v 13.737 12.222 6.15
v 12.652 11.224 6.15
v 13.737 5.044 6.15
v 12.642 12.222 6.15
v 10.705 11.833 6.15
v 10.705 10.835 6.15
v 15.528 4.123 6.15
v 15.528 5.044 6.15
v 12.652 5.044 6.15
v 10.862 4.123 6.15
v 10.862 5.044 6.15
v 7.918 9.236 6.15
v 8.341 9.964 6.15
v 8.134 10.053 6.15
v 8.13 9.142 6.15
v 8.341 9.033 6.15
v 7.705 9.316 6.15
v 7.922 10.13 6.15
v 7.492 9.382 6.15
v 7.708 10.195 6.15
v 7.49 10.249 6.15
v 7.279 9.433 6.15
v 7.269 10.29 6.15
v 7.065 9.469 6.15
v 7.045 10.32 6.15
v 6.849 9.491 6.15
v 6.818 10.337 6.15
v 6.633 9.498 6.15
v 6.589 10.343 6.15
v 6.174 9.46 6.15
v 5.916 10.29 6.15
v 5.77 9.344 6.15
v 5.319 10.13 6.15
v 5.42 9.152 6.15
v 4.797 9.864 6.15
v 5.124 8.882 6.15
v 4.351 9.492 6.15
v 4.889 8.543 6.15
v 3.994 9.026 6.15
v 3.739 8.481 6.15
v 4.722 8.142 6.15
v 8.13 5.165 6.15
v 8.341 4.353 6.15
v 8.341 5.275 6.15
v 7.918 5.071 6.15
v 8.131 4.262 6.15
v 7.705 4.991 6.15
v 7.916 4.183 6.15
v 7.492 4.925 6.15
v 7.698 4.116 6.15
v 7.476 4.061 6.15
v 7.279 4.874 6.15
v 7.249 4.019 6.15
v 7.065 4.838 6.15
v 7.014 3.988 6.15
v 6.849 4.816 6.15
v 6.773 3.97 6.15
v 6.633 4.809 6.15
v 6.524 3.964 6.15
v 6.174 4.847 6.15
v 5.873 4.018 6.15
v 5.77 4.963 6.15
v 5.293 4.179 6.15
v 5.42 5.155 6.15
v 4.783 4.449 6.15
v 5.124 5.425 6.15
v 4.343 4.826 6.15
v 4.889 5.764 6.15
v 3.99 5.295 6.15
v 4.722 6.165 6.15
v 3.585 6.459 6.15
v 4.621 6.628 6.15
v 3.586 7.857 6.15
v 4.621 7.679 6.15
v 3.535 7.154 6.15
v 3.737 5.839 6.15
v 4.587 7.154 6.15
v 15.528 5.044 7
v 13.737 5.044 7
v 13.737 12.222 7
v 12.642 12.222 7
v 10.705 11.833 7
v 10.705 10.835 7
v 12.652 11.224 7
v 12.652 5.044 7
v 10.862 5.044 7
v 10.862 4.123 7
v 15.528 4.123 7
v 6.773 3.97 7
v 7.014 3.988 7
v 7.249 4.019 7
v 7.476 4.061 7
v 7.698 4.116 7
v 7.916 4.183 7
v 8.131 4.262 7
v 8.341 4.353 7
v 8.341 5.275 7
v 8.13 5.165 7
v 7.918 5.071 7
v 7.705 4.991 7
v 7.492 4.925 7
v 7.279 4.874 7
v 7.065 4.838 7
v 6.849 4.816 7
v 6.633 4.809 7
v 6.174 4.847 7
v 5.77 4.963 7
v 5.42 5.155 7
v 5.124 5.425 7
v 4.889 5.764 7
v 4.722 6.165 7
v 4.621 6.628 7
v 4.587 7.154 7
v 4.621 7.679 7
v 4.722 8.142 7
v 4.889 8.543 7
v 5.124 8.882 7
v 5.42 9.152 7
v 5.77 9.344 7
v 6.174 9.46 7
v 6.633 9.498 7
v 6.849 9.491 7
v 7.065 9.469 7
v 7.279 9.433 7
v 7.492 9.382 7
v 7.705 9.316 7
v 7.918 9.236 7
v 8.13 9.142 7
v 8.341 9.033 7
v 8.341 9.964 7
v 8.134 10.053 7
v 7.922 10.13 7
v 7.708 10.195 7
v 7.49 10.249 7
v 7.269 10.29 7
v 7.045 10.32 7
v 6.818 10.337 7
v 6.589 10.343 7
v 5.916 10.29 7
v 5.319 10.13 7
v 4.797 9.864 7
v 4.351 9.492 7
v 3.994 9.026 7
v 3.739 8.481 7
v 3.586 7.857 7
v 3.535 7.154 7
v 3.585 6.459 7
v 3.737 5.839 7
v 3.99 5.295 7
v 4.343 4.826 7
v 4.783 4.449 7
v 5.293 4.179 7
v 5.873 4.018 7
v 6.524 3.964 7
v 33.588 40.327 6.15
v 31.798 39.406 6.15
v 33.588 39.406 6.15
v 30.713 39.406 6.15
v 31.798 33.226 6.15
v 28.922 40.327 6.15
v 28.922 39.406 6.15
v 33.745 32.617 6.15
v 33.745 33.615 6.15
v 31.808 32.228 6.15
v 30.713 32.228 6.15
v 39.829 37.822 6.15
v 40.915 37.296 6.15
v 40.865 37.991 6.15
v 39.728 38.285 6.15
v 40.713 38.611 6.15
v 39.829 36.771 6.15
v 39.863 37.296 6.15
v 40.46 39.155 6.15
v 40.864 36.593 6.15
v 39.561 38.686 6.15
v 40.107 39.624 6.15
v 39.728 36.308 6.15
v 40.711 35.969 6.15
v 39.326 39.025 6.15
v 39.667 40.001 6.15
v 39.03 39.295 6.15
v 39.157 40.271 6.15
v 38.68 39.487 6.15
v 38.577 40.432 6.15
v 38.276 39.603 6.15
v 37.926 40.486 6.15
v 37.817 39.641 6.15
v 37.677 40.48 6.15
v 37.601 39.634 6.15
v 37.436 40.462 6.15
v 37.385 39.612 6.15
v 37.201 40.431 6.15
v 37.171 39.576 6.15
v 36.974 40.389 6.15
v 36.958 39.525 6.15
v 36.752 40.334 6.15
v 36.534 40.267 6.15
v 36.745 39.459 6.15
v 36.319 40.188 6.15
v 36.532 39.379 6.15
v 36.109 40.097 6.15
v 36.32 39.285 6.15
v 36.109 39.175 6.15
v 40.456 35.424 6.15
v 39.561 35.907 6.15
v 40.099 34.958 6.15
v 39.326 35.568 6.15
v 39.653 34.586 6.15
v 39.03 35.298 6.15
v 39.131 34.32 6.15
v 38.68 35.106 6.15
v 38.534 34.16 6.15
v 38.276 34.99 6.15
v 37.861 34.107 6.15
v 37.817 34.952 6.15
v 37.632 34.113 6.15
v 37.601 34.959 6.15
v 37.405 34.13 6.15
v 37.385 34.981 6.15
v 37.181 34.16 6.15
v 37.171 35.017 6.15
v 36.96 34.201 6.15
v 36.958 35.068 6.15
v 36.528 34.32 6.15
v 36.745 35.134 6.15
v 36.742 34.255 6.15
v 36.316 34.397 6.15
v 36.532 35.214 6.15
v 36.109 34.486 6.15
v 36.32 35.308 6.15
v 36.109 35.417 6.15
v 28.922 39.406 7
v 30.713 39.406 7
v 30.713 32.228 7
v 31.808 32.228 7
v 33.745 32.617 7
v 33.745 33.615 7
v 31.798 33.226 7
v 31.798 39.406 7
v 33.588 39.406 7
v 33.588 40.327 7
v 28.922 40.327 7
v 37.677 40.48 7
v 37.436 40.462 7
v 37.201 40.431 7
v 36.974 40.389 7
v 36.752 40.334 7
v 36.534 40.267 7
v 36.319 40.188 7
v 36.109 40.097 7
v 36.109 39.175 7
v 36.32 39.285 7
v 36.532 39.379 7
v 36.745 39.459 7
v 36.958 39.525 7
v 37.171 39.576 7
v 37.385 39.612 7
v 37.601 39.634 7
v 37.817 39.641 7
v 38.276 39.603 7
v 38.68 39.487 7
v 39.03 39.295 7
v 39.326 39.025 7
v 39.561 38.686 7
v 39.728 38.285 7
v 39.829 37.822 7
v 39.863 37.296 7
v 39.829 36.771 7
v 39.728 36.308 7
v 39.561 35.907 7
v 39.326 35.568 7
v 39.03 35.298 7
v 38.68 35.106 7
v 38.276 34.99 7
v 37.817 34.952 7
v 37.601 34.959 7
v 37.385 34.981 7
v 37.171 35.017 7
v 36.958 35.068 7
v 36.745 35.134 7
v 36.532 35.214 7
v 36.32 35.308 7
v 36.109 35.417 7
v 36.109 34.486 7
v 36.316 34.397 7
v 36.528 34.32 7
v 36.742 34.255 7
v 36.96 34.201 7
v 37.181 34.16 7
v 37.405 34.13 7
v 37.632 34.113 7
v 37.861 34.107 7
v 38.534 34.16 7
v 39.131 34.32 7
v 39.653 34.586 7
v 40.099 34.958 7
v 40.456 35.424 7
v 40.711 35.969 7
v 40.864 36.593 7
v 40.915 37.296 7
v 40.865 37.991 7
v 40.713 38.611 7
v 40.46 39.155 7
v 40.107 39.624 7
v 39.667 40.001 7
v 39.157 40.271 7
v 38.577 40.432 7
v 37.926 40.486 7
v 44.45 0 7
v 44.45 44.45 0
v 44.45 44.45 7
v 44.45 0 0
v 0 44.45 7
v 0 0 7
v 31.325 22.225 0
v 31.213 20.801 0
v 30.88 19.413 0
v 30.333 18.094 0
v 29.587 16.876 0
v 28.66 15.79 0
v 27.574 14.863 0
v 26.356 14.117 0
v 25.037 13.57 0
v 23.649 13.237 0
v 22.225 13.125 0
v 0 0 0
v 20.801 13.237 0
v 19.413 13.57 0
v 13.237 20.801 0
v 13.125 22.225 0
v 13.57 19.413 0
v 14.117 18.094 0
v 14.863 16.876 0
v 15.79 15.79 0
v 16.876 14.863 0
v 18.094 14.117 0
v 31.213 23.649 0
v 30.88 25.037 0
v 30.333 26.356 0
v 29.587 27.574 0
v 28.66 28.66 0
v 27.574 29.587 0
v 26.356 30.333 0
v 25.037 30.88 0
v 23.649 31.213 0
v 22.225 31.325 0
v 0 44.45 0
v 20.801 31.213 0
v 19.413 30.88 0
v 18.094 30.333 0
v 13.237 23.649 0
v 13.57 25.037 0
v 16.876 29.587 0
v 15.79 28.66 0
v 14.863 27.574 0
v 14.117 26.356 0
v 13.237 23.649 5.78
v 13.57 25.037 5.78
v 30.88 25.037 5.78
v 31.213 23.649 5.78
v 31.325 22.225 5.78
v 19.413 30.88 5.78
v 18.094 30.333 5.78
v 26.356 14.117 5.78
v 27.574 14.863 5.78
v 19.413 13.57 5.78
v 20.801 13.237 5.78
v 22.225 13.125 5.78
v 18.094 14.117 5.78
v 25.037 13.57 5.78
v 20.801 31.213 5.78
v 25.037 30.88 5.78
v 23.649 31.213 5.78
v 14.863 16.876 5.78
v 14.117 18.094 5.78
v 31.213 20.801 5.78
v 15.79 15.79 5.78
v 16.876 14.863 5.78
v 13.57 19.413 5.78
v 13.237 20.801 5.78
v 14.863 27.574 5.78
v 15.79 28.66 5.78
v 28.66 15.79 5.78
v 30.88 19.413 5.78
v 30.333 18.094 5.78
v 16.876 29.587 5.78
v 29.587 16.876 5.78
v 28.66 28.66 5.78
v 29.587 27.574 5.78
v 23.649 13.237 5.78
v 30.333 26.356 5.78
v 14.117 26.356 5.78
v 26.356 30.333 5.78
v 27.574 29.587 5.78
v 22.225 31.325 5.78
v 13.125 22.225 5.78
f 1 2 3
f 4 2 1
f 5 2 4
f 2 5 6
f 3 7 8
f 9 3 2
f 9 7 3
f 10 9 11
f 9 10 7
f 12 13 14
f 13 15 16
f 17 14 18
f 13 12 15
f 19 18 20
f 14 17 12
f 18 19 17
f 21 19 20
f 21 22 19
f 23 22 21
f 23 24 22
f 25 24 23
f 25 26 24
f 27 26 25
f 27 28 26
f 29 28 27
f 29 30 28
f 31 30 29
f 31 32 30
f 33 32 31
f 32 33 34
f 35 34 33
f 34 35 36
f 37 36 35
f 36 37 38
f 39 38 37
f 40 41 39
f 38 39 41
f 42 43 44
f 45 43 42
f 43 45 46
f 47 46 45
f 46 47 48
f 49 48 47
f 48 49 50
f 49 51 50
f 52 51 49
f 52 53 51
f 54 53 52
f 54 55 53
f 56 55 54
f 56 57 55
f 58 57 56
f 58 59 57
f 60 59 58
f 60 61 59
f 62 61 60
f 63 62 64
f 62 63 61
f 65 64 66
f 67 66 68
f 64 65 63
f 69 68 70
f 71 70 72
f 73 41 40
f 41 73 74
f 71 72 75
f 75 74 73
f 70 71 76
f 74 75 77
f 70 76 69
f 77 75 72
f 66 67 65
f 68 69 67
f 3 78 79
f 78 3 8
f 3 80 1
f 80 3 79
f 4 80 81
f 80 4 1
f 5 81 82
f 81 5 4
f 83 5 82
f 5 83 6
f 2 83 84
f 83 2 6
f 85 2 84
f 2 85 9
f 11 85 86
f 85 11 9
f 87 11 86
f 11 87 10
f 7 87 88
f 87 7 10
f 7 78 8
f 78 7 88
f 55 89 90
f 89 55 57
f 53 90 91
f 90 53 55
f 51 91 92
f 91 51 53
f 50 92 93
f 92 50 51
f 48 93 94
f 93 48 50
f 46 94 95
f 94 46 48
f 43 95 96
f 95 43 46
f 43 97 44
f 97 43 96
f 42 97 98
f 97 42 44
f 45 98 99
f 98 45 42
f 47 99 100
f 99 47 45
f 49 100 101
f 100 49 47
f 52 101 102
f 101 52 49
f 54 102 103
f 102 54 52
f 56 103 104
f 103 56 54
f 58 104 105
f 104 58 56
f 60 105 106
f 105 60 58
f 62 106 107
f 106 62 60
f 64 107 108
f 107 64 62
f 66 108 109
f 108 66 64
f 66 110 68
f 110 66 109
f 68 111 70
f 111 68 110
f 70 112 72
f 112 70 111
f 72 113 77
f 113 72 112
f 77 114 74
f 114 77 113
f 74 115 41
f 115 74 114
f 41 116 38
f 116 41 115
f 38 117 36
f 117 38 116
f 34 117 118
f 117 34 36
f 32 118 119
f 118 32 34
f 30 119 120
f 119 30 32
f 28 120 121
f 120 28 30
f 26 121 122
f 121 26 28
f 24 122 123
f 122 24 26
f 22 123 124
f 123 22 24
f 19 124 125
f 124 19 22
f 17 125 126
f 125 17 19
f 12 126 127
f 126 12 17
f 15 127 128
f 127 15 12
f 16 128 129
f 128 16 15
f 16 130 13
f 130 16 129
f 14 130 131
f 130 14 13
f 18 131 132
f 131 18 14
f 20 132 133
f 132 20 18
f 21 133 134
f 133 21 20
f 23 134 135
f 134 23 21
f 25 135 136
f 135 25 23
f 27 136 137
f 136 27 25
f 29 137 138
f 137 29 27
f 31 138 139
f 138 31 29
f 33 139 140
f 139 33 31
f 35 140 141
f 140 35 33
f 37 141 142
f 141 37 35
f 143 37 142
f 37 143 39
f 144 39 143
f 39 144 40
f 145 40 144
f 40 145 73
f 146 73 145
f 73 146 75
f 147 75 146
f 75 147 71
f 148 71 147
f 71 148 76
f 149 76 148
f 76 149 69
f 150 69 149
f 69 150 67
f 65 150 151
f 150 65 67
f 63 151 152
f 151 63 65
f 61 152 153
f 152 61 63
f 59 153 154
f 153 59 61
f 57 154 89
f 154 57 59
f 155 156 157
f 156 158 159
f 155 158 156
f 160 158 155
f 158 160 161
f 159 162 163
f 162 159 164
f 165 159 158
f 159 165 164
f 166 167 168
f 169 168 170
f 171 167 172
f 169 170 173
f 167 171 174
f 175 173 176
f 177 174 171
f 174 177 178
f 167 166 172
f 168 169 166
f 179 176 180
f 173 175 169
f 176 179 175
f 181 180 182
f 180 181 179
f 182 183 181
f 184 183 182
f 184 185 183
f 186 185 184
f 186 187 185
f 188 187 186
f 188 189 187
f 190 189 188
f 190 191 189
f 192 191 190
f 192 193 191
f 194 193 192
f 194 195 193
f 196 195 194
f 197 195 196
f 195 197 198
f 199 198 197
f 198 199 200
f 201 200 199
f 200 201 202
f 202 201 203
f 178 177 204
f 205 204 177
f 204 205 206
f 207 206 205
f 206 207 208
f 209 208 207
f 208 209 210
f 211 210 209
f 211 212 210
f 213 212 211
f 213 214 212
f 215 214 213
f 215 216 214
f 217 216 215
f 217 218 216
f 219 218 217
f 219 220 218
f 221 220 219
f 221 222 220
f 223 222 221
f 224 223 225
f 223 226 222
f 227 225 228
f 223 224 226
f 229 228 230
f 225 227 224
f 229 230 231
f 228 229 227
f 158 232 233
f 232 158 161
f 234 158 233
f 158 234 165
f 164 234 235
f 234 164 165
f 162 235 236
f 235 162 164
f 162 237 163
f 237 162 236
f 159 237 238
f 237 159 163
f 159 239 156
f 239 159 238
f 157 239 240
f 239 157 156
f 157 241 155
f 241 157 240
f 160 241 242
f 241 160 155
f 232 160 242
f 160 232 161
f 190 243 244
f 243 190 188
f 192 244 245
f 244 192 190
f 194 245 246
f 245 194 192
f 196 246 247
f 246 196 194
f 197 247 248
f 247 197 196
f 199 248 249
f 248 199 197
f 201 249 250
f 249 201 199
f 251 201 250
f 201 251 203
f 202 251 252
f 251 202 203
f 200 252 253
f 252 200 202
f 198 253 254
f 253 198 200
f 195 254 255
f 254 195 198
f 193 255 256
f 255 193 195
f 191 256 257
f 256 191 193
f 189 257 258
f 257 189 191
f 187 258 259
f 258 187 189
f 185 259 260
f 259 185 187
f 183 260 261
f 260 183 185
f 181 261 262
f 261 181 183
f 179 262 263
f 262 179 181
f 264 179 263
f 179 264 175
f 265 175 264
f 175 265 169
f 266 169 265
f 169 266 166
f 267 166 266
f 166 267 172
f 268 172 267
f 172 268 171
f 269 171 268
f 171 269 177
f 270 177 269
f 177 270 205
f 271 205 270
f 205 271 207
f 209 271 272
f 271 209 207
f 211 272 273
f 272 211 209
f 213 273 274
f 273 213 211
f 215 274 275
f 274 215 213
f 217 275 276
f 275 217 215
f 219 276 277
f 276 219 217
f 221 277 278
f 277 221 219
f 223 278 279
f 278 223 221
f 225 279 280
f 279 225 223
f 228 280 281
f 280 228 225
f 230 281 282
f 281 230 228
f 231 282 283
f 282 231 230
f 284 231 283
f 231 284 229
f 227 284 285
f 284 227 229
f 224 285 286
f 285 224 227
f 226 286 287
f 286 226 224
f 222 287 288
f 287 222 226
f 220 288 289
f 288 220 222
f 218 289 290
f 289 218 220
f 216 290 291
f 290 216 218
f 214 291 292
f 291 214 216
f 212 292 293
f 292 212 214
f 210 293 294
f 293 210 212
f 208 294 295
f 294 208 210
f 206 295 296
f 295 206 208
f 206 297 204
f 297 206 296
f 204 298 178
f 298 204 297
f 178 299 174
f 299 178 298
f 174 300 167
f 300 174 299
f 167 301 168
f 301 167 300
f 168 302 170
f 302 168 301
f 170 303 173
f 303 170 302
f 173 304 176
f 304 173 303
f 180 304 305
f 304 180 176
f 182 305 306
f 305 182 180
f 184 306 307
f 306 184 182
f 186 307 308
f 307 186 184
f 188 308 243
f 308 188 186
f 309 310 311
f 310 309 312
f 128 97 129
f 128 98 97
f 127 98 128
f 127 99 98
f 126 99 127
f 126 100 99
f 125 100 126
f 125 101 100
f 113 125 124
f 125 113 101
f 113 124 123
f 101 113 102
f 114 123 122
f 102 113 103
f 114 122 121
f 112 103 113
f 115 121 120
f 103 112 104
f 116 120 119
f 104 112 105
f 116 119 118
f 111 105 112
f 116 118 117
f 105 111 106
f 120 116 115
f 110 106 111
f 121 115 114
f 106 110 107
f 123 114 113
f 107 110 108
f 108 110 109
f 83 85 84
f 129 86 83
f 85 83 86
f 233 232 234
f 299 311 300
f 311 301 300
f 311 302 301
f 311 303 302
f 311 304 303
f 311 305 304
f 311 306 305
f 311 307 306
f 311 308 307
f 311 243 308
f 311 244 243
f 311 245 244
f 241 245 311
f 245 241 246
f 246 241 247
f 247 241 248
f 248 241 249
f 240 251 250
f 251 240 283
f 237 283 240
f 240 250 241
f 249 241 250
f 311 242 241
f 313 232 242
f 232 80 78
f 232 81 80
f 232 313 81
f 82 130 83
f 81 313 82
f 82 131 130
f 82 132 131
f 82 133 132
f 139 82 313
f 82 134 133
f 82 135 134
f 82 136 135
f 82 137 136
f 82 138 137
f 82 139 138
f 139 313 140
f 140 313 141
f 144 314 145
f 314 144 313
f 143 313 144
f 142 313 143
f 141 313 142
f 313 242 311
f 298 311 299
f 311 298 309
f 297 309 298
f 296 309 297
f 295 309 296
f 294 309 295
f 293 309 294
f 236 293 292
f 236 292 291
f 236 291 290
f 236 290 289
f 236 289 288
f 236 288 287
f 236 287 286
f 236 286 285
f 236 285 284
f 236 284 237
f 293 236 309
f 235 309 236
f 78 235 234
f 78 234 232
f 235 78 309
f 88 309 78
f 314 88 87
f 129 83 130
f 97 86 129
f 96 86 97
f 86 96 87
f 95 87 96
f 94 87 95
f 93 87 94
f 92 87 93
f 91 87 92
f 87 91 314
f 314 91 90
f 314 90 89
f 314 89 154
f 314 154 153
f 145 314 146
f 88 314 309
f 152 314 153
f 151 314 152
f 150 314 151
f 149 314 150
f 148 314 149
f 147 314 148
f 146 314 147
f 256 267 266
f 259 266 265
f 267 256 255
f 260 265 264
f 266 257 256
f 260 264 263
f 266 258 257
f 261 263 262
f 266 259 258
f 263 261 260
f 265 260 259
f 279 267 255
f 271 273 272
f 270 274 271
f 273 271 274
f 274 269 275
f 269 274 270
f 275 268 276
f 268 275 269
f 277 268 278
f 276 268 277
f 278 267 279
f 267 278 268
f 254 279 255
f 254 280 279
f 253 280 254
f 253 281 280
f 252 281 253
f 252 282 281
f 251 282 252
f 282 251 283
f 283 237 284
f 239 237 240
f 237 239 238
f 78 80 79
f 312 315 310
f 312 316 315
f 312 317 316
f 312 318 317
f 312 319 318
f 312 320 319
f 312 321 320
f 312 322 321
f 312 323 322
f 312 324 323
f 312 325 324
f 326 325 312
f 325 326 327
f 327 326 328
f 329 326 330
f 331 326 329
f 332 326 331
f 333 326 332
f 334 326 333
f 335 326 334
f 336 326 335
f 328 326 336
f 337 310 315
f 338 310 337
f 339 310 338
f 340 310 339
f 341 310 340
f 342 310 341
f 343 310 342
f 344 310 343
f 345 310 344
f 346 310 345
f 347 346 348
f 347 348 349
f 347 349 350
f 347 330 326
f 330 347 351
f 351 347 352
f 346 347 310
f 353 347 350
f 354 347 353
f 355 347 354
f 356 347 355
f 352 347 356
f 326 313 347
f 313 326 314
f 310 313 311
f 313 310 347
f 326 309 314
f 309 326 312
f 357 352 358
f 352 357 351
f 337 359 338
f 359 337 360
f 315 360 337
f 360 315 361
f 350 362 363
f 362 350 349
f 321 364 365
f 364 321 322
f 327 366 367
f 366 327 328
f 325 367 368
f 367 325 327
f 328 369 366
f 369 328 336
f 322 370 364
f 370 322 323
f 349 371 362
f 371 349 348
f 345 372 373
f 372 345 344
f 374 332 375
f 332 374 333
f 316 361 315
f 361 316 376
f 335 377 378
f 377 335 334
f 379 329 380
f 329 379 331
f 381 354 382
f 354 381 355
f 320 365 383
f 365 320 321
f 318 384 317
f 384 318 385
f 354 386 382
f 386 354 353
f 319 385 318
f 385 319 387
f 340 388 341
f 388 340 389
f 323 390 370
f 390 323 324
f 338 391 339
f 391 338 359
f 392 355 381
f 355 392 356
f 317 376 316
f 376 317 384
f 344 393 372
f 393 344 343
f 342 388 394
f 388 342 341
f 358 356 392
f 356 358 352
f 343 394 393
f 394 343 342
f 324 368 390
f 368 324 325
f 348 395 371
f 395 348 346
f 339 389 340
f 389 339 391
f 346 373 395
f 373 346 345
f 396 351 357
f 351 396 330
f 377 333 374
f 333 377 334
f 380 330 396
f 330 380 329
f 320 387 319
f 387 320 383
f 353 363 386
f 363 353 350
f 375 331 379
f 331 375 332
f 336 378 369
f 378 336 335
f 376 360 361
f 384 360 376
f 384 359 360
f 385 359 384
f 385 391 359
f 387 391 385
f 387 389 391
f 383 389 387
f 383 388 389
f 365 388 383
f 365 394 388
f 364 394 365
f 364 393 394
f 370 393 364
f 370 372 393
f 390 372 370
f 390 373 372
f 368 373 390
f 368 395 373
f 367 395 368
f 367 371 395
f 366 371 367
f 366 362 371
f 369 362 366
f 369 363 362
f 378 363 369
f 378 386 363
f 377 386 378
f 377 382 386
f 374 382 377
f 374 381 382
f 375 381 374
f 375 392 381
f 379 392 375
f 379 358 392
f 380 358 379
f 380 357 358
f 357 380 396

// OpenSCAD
part="custom";
tile_size=inches(1.75);
tile_height=7;
letters="c";
numbers="1";
font="Open Sans";
text_size=8;
text_depth=0.85;
text_spacing=1.1;
text_offset=2;
magd=18.2;
magh=5.8;
spacing=4;
bezel_size=0;// inches(1.25);
bezel_line_width=2;

if(part=="white_even")
  tiles("aceg","2468");
else if(part=="white_odd")
  tiles("bdfh","1357");
else if(part=="black_even")
  tiles("bdfh","2468");
else if(part=="black_odd")
  tiles("aceg","1357");
else if(part=="custom")
  tiles(letters,numbers);

module tiles(cols,rows)
{
  for(coli=[0:len(cols)-1],rowi=[0:len(rows)-1])
    translate([coli*(tile_size+spacing),rowi*(tile_size+spacing)]) tile(text=str(cols[coli],rows[rowi]));
}
module tile(text="a1")
{
  difference() {
    cube([tile_size,tile_size,tile_height]);
    translate([tile_size/2,tile_size/2,-.02]) cylinder(d=magd,h=magh,$fn=40);
    for(t=[0,1]) translate([text_size+text_offset+(tile_size-text_size*2-text_offset*2)*t,text_size+(tile_size-text_size*2)*t,tile_height-text_depth]) rotate([0,0,t*180]) {
      linear_extrude(2,convexity=3) {
        text(text,valign="center",halign="center",size=text_size,font=font,spacing=text_spacing);
        *translate([-4,-4]) difference() {
          square([20,20],center=true);
          square([18,18],center=true);
        }
      }
    }
  }
}
module quadrant(bezel_left=1,bezel_bottom=1,spaces_wide=4,spaces_tall=4) {
difference(){
  translate([bezel_left?-bezel_size:0,bezel_bottom?-bezel_size:0])
  cube([tile_size*spaces_wide+bezel_size,tile_size*spaces_tall+bezel_size,4]);
  if(bezel_size>0&&bezel_line_width>0)
  {
    translate([bezel_left?-bezel_line_width:tile_size*4,bezel_bottom?-bezel_line_width:0,2]) cube([bezel_line_width+.01,tile_size*4+bezel_line_width,4]);
    translate([bezel_left?-bezel_line_width:0,bezel_bottom?-bezel_line_width:tile_size*4,2]) cube([tile_size*4+bezel_line_width,bezel_line_width,4]);
  }
  for(x=[0:3])
    for(y=[0:3])
      if(y%2==x%2)
        translate([x*tile_size-.01,y*tile_size-.01,0.6]) cube([tile_size+.02,tile_size+.02,5]);
}
}
*cube([inches(2),inches(2),6]);
*difference() {
  cube([inches(5.5),inches(70),inches(3/4)]);
  #for(y=[0:inches(2.125):inches(70-2.125)])
    translate([-.01,y-.01]) cube([inches(2.125),inches(2.125)+.02,inches(1)]);
}
function inches(mm) = 25.4 * mm;
